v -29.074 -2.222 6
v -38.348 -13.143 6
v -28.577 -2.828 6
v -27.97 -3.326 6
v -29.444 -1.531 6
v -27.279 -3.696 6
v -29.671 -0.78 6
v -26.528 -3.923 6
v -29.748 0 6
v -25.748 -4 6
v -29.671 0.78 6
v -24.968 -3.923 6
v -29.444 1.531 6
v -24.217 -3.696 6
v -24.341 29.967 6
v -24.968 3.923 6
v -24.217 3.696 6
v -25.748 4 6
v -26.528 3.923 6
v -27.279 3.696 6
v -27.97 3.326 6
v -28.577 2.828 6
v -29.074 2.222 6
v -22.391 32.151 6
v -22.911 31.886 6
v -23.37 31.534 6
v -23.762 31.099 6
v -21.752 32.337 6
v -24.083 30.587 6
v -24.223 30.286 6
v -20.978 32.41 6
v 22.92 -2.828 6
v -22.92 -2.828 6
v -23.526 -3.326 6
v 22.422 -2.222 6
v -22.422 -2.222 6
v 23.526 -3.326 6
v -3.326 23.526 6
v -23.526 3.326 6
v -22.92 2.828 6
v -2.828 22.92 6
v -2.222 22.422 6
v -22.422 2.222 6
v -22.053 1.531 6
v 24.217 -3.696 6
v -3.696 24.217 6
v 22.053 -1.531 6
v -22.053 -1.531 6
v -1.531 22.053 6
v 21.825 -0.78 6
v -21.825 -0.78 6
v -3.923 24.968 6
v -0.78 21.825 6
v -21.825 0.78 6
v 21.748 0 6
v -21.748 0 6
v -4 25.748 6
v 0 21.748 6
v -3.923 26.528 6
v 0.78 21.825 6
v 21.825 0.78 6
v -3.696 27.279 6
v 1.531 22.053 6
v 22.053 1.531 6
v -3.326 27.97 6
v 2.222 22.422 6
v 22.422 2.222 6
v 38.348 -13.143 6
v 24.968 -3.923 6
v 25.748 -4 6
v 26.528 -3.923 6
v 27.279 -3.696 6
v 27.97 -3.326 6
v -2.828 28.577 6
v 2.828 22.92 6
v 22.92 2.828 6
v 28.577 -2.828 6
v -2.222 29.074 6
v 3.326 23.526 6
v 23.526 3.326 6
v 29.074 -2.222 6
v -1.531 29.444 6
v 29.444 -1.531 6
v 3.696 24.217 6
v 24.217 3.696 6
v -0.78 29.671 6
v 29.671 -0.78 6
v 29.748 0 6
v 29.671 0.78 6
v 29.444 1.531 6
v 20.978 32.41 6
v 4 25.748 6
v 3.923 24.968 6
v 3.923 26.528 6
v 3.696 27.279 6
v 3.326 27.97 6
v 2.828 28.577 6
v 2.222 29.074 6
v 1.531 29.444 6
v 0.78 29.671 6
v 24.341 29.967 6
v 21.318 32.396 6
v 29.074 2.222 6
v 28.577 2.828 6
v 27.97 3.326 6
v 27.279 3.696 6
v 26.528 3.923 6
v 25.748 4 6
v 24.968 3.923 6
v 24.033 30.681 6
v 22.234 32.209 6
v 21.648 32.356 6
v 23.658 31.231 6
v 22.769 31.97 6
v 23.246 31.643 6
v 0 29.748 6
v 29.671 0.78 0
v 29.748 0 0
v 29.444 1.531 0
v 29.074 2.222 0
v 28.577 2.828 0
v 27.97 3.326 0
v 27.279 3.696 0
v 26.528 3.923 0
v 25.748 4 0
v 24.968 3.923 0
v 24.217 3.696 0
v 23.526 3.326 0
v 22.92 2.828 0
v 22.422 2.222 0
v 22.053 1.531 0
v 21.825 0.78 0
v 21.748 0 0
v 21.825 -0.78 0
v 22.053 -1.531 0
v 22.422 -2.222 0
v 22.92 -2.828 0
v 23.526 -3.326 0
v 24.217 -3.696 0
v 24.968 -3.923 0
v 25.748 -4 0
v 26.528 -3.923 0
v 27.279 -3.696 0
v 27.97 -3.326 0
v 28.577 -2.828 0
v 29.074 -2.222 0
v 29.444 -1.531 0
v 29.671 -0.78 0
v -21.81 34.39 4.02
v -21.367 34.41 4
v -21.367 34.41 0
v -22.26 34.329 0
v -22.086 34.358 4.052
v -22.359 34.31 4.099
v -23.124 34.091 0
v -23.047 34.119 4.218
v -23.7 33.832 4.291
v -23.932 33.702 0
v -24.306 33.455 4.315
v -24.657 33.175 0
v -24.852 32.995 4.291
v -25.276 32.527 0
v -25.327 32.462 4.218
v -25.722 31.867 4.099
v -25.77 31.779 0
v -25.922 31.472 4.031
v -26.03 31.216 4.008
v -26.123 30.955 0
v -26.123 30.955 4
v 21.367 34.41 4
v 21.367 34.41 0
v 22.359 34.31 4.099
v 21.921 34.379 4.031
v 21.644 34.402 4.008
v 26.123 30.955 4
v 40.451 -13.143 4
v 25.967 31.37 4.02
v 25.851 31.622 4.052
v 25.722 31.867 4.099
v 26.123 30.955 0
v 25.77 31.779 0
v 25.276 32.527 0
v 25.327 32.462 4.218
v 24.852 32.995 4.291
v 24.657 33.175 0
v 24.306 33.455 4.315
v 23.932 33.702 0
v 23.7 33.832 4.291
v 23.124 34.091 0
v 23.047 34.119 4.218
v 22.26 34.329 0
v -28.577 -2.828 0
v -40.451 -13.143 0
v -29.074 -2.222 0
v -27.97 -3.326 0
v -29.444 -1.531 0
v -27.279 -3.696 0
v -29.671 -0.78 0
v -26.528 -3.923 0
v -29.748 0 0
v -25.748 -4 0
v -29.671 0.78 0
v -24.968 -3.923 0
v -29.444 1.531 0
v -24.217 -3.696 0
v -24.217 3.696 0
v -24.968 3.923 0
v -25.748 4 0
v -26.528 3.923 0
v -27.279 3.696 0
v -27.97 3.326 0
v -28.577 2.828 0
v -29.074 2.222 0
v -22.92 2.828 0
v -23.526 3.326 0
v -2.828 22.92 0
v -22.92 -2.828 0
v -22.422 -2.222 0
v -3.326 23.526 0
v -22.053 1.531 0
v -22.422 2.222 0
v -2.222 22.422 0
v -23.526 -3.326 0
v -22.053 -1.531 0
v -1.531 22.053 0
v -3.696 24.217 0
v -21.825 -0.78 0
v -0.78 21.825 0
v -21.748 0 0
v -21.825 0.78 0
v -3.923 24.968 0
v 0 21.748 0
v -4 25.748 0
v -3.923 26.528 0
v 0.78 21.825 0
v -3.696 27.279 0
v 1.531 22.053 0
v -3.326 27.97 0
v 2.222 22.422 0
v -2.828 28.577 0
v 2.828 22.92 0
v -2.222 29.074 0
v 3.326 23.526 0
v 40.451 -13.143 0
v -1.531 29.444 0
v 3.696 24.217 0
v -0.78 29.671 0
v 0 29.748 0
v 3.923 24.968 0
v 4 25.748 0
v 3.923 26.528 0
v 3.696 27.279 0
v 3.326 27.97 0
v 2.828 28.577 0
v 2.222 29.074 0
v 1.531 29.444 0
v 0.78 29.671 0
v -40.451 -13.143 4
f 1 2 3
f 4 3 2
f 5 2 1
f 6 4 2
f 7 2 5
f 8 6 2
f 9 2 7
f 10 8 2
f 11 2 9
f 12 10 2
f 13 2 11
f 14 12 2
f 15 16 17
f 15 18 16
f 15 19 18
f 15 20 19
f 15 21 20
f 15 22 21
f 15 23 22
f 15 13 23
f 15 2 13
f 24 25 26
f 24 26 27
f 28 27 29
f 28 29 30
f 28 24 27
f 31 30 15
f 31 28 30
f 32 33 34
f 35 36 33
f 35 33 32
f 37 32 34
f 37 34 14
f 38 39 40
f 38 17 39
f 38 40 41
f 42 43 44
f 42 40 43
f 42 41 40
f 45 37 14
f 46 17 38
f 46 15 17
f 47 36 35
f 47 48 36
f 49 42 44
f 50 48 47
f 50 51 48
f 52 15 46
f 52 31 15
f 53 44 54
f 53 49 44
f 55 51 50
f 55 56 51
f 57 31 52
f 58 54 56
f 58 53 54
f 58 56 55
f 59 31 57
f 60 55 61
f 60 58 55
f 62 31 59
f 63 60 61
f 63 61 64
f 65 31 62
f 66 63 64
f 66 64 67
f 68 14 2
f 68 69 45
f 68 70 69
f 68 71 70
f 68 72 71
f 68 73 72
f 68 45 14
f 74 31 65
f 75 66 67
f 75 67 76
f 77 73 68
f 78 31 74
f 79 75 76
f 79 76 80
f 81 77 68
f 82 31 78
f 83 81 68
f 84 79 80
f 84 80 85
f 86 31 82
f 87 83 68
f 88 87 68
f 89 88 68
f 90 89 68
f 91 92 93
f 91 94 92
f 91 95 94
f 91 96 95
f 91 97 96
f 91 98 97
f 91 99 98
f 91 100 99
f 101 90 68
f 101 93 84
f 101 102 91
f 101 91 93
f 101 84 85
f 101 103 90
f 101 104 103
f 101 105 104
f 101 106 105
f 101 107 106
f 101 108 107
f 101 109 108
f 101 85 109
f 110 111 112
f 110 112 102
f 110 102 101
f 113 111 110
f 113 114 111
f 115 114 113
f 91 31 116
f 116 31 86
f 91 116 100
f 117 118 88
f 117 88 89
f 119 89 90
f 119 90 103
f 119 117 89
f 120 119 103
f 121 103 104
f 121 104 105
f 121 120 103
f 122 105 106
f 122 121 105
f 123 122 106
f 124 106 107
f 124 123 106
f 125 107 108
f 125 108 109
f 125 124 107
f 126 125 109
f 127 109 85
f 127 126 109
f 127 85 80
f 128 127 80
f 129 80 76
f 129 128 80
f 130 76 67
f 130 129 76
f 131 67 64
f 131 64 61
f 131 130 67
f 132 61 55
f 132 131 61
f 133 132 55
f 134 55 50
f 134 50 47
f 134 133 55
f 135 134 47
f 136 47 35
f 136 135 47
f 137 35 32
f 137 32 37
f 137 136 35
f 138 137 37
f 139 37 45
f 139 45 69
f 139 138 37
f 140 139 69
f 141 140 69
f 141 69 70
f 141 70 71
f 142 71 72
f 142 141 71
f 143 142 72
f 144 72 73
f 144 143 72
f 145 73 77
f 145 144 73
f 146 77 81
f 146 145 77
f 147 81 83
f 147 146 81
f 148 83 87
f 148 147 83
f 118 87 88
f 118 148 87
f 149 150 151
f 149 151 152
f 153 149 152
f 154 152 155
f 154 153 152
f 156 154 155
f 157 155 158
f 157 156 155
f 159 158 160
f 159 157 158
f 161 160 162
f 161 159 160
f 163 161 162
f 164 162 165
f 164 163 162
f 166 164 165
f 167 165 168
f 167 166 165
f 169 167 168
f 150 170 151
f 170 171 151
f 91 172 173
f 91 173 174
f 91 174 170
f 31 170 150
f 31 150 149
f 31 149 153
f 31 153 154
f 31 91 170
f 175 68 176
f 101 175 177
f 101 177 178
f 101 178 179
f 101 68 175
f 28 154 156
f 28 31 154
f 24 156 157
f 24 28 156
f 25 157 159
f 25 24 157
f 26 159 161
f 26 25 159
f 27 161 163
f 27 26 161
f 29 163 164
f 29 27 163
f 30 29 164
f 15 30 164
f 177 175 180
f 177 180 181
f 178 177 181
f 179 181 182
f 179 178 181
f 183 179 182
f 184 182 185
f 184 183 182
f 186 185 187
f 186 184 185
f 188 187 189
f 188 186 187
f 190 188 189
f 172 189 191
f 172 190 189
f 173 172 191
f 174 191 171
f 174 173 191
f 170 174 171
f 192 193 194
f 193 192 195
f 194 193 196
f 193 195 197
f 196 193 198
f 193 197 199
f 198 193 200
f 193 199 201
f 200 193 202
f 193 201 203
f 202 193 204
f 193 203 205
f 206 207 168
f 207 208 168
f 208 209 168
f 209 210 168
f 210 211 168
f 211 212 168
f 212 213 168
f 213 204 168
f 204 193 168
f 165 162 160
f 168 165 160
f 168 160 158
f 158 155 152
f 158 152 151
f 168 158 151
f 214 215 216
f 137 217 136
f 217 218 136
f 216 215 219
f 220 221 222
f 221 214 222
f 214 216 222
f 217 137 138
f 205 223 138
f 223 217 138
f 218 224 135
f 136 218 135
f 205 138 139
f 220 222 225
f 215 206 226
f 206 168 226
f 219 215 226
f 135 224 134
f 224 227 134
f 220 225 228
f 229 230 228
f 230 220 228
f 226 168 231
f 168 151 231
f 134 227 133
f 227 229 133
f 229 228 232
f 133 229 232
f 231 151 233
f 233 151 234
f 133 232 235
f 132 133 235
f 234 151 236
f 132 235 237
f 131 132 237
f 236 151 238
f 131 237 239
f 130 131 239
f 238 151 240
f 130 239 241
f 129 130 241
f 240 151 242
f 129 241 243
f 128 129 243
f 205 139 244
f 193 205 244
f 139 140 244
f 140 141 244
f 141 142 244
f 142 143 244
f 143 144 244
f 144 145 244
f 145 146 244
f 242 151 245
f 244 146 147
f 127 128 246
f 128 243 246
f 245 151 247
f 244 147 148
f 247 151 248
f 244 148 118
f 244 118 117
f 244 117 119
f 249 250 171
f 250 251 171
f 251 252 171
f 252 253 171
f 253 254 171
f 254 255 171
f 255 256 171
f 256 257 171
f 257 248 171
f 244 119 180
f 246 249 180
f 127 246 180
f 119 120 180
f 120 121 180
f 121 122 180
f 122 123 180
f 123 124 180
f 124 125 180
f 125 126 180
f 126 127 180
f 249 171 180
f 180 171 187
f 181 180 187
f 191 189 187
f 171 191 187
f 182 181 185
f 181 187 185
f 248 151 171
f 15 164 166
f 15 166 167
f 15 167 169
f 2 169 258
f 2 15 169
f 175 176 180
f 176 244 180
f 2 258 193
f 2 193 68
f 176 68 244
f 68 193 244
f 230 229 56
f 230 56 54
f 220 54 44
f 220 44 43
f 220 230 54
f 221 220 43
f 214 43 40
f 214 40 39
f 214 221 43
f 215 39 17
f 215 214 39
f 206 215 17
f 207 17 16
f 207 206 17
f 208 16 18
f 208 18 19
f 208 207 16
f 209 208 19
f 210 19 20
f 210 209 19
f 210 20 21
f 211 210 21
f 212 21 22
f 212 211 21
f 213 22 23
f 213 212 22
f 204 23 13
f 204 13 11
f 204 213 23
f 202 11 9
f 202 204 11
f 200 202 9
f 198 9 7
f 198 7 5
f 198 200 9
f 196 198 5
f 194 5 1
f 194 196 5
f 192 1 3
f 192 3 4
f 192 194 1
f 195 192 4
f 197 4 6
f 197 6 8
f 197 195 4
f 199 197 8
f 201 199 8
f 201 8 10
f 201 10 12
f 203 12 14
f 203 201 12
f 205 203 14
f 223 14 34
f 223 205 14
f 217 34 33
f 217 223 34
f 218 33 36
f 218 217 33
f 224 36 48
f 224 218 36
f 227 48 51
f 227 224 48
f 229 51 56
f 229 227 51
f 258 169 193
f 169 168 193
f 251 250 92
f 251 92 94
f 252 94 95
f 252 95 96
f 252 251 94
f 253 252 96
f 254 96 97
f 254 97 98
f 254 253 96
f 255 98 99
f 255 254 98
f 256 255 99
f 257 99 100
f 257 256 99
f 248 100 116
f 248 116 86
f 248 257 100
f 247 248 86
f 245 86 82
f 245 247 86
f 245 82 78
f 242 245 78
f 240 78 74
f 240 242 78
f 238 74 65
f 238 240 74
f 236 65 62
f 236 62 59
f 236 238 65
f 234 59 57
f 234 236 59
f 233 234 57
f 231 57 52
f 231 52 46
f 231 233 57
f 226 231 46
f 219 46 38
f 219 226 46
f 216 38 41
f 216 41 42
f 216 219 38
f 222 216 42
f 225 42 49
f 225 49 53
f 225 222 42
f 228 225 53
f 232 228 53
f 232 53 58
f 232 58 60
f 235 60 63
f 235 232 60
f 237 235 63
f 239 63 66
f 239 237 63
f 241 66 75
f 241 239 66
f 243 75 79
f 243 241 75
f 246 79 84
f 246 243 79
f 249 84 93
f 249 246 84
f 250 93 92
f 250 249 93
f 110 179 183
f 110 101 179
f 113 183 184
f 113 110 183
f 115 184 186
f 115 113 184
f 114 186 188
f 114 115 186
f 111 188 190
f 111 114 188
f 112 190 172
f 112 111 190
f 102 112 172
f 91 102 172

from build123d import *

# Parameters (mm, degrees)
F0_R     = 4
F1_DEPTH = 6
F2_SIZE  = 2
F3_F1_R  = 5
F3_F2_R  = 5
F3_F3_R  = 5
F3_F4_R  = 5


with BuildPart() as f1:
    # F0 (on Top) → F1 (new body)
    with BuildSketch(Plane.XY):
        Polygon((40.4508497187, -13.143277803), (25, 34.4095480118), (-25, 34.4095480118), (-40.4508497187, -13.143277803), align=None)
        with Locations((-25.7480759174, 0)):
            Circle(F0_R, mode=Mode.SUBTRACT)
        with Locations((25.7480759174, 0)):
            Circle(F0_R, mode=Mode.SUBTRACT)
        with Locations((0, 25.7480759174)):
            Circle(F0_R, mode=Mode.SUBTRACT)
    extrude(amount=F1_DEPTH)

    # F2
    f2_edges = [f1.edges().sort_by_distance(p)[0] for p in [
        (0, 34.409548, 6),
        (32.725425, 10.633135, 6),
        (-32.725425, 10.633135, 6),
    ]]
    chamfer(f2_edges, length=F2_SIZE)

    # F3: fillet of radius 5 on 4 edges, made by hand

    # F3_f1
    f3_f1_edges = [f1.edges().sort_by_distance(p)[0] for p in [
        (25, 34.4095480118, 2),
    ]]
    fillet(f3_f1_edges, radius=F3_F1_R)

    # F3_f2
    f3_f2_edges = [f1.edges().sort_by_distance(p)[0] for p in [
        (23.9265642827, 32.9320904977, 5.4774575141),
    ]]
    fillet(f3_f2_edges, radius=F3_F2_R)

    # F3_f3
    f3_f3_edges = [f1.edges().sort_by_distance(p)[0] for p in [
        (-25, 34.4095480118, 2),
    ]]
    fillet(f3_f3_edges, radius=F3_F3_R)

    # F3_f4
    f3_f4_edges = [f1.edges().sort_by_distance(p)[0] for p in [
        (-23.9265642827, 32.9320904977, 5.4774575141),
    ]]
    fillet(f3_f4_edges, radius=F3_F4_R)


solid = f1.part
